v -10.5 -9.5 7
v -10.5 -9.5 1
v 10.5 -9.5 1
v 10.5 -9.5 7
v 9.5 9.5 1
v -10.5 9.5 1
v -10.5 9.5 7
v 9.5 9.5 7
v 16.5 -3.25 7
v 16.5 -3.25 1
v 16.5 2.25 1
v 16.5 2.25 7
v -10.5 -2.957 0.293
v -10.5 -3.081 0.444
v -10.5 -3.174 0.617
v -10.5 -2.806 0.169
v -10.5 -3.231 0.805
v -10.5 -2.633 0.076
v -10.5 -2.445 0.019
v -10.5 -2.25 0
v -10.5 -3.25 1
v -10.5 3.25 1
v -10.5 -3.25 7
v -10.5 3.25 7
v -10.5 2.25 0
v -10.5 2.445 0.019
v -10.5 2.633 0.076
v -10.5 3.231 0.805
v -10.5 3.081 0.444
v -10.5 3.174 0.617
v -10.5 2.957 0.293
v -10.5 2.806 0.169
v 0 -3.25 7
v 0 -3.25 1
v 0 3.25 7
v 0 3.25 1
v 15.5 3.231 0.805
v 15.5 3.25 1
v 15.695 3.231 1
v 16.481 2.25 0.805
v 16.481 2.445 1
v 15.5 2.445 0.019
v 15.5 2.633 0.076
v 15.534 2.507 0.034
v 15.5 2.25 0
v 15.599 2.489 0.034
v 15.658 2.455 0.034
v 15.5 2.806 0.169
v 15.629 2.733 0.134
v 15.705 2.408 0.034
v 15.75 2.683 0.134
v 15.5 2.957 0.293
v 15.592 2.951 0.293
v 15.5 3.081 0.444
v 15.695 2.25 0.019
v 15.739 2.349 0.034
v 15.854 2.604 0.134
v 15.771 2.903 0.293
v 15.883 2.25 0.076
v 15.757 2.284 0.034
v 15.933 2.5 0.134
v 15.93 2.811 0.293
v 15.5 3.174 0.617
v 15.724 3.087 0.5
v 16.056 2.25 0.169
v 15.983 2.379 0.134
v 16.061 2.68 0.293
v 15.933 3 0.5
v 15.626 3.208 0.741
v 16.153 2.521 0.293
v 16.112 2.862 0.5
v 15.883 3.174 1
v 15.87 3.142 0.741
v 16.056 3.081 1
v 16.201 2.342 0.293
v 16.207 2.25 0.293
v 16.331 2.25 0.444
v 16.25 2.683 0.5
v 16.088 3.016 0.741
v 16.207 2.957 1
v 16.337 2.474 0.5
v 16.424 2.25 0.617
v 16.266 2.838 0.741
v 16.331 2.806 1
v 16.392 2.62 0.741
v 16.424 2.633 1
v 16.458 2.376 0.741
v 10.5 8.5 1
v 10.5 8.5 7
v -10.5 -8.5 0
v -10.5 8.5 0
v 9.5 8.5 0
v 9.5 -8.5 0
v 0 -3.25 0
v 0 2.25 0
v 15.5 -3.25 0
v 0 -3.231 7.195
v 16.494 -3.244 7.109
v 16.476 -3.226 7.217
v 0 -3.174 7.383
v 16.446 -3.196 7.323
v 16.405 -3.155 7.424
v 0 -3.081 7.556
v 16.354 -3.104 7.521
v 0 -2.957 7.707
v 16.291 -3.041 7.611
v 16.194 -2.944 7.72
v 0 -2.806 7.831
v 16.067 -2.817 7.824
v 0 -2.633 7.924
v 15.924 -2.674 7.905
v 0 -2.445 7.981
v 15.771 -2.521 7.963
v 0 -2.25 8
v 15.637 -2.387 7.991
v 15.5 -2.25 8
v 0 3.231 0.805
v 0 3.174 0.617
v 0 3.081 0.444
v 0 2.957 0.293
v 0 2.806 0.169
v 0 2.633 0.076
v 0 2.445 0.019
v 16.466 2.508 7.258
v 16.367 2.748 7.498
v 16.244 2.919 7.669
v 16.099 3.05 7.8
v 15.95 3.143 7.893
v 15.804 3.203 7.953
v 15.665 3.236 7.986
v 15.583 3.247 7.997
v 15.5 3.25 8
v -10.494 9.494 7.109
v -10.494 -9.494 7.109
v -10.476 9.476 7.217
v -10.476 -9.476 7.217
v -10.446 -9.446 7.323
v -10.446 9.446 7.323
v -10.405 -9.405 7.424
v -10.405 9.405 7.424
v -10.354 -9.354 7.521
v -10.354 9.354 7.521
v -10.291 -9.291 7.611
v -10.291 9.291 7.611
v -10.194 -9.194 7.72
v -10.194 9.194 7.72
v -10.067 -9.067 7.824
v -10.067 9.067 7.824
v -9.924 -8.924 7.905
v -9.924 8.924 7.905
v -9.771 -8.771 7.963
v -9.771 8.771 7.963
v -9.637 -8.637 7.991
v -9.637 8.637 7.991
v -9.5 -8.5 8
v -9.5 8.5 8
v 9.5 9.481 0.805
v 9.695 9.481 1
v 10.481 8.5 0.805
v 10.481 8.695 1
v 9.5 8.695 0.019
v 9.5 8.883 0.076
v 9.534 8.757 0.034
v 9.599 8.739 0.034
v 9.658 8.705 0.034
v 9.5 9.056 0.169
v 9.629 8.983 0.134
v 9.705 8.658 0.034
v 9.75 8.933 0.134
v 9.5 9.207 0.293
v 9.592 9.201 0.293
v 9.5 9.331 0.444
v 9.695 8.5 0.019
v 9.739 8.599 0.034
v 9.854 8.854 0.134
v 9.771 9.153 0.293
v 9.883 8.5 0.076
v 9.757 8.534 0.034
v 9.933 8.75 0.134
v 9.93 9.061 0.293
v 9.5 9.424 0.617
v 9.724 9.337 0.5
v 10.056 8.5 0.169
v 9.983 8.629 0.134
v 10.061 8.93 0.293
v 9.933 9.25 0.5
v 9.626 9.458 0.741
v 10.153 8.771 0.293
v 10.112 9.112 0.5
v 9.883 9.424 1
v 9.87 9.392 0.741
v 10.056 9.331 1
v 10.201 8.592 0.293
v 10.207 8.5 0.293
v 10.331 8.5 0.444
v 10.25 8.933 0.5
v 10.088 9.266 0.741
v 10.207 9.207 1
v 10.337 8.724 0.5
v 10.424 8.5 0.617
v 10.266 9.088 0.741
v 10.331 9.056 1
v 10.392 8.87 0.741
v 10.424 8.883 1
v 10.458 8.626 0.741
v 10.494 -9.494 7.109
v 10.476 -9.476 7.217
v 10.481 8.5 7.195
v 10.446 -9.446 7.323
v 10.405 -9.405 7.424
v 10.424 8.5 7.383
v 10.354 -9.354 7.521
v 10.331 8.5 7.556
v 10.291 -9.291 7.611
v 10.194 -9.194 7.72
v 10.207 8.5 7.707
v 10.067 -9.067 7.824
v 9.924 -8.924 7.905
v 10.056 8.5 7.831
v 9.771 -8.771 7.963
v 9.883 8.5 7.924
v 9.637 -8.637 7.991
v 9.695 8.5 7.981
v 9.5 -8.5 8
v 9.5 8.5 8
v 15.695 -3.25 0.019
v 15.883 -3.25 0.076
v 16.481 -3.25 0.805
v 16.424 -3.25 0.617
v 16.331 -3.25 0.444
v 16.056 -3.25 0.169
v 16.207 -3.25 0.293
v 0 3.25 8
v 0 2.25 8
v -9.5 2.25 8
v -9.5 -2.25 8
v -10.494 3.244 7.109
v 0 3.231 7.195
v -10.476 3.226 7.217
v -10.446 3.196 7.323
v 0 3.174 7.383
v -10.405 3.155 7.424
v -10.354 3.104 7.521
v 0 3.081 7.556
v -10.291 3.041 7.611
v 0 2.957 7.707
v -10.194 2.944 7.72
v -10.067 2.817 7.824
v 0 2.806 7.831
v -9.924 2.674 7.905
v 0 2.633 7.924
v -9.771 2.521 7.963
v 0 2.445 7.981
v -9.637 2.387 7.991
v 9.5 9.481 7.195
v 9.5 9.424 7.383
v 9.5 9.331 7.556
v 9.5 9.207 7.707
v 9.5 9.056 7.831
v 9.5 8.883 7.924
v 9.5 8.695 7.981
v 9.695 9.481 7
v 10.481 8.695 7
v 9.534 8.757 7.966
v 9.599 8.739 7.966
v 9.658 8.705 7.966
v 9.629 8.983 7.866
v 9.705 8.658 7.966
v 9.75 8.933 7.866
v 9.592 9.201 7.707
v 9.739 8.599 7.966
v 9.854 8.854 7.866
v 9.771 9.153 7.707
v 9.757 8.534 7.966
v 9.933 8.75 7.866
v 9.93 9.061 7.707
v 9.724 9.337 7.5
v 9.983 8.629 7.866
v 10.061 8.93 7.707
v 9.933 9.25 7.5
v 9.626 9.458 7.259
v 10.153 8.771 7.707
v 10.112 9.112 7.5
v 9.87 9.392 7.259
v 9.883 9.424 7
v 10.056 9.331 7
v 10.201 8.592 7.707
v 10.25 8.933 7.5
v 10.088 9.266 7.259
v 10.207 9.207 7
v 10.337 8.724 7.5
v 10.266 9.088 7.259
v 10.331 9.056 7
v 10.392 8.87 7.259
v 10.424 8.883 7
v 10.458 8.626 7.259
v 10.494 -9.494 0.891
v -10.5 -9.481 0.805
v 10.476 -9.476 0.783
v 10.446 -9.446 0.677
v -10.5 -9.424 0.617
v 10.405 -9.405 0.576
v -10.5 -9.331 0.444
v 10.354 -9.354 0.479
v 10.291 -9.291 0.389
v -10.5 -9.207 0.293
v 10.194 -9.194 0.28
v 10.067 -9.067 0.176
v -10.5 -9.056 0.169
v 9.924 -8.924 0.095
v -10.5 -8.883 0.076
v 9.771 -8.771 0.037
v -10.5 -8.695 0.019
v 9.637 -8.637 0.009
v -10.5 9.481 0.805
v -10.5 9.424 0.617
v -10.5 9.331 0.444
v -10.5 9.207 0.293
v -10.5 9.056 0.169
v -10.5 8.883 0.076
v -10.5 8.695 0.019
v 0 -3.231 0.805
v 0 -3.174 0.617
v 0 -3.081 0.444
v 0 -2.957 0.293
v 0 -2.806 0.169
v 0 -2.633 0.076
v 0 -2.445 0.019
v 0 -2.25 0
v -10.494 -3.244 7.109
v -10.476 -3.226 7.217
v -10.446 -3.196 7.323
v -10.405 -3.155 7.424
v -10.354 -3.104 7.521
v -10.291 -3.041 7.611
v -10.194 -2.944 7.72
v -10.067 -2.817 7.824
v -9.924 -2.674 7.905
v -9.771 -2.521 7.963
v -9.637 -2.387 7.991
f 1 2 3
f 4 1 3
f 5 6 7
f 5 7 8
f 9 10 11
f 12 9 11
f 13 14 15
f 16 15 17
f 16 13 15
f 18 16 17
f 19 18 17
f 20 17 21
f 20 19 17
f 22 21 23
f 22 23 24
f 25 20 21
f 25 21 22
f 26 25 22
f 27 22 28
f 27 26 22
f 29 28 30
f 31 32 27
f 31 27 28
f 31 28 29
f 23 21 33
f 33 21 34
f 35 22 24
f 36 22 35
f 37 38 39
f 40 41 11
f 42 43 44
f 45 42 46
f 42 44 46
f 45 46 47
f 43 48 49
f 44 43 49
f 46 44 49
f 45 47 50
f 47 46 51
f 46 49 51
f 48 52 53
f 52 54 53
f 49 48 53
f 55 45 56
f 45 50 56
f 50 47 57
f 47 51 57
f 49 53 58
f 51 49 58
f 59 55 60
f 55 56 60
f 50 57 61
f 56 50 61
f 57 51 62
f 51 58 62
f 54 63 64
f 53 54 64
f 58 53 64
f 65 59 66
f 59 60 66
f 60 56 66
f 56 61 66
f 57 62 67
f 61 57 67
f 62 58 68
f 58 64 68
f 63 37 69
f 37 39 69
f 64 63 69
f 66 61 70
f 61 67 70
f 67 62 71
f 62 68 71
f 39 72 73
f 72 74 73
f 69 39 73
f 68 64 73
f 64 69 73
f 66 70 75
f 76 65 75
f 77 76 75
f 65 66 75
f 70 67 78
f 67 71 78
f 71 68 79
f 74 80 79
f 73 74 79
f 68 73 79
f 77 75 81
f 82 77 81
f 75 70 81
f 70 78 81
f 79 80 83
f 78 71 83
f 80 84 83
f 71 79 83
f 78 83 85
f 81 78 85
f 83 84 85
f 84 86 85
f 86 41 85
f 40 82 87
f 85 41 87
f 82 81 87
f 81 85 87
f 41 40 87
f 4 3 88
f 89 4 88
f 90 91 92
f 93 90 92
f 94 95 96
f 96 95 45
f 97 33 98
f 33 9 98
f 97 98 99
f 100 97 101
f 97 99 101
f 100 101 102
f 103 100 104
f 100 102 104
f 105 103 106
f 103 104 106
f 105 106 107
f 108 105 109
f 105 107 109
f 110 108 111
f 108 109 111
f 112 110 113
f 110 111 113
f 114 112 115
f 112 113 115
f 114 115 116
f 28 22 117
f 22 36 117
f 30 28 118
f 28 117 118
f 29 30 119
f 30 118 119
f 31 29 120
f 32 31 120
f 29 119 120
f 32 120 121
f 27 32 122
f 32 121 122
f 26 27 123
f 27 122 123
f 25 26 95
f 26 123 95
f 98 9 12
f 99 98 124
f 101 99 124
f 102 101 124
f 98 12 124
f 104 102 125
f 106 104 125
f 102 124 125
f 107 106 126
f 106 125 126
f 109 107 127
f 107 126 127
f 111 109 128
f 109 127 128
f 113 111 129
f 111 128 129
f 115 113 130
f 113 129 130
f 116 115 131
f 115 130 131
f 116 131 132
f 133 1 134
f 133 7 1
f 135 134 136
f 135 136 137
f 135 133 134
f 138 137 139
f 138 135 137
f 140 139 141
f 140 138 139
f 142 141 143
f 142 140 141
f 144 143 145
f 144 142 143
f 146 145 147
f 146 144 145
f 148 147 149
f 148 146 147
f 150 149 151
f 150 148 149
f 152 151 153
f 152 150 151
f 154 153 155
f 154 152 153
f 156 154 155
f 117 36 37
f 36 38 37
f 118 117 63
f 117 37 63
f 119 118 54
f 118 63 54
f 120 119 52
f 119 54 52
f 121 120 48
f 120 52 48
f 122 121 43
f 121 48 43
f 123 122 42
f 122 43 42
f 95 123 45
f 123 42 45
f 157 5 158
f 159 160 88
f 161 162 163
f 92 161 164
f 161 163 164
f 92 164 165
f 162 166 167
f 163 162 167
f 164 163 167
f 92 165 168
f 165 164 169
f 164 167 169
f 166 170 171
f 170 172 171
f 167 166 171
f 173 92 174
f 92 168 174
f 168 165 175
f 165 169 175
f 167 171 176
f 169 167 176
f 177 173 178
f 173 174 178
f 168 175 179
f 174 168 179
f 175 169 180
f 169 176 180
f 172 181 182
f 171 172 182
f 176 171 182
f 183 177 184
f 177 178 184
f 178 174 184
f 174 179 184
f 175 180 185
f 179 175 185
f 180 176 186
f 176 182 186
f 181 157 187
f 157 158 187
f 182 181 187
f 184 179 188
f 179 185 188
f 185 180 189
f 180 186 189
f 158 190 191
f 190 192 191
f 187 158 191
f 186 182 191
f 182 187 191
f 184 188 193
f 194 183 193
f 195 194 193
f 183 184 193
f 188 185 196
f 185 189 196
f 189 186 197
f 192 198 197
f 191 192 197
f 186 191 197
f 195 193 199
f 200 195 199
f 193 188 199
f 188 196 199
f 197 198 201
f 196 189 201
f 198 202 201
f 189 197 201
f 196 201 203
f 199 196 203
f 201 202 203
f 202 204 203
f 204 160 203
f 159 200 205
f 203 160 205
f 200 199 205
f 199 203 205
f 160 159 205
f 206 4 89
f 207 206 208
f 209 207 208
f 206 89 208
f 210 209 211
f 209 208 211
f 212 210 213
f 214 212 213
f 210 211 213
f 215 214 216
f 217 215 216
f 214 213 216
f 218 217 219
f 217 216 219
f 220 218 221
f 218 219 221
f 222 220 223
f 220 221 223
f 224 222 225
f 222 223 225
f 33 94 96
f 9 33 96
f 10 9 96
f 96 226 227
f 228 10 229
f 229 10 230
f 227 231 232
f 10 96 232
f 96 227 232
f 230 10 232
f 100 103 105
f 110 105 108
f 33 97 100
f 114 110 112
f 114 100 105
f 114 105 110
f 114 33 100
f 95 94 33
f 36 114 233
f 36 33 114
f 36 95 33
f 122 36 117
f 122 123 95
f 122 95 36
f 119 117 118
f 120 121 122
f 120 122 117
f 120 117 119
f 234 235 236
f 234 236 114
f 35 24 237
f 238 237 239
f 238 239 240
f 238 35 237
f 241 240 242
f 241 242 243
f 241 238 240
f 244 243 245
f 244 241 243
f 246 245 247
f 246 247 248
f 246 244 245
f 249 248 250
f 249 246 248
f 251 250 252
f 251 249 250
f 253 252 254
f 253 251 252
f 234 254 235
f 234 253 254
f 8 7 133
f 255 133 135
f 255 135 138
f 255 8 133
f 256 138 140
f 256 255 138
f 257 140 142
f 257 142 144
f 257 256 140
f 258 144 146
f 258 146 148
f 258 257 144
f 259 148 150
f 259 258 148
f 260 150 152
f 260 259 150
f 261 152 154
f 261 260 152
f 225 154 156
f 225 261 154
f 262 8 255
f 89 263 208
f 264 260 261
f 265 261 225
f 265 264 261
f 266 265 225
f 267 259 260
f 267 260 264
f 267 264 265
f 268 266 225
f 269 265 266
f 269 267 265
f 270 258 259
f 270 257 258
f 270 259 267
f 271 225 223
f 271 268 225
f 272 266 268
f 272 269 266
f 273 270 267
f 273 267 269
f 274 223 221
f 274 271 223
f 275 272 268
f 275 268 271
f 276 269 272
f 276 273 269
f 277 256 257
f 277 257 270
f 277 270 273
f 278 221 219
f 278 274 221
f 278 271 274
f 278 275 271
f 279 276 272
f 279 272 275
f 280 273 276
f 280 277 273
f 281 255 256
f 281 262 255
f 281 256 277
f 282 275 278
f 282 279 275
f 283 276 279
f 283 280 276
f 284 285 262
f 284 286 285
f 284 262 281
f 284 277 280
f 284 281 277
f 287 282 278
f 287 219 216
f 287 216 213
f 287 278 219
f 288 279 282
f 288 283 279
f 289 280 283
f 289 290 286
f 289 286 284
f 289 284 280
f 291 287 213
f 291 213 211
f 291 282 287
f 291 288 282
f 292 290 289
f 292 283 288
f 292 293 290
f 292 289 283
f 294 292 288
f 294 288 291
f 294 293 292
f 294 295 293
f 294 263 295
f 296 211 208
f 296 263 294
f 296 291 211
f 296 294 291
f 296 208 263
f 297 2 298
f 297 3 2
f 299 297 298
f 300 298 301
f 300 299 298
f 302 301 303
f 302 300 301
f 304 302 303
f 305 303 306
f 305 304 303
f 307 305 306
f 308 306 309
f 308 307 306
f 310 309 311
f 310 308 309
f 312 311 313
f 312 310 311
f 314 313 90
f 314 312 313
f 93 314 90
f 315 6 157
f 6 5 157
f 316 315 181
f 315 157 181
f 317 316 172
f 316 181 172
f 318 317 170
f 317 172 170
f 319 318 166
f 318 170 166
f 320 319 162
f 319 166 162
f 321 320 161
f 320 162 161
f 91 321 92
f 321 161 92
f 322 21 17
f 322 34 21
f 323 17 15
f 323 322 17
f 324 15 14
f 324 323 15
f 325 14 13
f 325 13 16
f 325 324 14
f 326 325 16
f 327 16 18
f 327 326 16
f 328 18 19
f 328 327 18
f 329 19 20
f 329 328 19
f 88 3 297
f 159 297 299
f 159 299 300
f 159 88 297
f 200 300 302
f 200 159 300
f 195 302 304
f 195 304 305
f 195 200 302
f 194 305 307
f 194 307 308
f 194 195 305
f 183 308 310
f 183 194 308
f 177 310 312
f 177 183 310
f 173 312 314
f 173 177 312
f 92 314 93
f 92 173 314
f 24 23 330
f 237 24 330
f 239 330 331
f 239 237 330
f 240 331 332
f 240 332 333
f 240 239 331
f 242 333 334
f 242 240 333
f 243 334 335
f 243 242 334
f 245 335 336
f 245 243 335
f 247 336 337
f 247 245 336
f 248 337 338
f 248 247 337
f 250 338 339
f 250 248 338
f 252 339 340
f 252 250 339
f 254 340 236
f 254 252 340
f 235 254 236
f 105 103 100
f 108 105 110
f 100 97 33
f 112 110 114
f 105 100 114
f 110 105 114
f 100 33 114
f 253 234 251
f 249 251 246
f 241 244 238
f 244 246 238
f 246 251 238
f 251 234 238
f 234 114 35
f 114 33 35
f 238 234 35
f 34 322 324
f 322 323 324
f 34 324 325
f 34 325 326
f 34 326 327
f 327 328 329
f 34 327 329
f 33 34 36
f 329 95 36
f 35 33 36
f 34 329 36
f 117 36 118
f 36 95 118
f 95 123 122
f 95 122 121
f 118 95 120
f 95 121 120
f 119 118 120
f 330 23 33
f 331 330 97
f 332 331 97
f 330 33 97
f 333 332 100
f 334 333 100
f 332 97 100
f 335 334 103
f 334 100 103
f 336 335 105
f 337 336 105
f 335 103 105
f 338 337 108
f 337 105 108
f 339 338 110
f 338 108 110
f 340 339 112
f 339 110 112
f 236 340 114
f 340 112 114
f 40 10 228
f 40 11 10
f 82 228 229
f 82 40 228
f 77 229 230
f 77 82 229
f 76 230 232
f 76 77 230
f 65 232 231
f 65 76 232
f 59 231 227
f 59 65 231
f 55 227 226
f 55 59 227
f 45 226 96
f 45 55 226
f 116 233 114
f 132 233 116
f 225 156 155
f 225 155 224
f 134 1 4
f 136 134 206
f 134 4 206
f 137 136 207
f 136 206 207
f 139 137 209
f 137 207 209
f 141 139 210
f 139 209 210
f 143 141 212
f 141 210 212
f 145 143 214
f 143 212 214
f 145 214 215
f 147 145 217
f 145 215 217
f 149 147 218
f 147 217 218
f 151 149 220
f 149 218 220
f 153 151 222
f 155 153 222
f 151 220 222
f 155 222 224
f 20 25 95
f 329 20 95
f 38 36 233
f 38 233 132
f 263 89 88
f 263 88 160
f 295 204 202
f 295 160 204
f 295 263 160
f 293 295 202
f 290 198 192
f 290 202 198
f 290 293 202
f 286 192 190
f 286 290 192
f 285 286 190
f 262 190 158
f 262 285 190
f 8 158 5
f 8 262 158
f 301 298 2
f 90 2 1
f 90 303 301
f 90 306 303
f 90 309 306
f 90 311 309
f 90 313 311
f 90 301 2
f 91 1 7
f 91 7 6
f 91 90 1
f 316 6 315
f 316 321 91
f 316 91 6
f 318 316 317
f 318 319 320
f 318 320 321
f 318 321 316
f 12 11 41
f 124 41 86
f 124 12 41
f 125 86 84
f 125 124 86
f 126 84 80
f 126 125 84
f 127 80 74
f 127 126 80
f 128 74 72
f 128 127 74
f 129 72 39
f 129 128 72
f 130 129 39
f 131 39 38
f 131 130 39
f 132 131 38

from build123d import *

# Parameters (mm, degrees)
SKETCH002_W      = 16.5
SKETCH002_H      = 6.5
EXTRUDE004_DEPTH = 8
FILLET_R         = 1
SKETCH_W         = 21
SKETCH_H         = 19
EXTRUDE_DEPTH    = 8
FILLET001_R      = 1
SKETCH001_W      = 10.5
SKETCH001_H      = 6.5
EXTRUDE001_DEPTH = 8
FILLET002_R      = 1


with BuildPart() as fillet_body:
    # Sketch002 → Extrude004 (new body)
    with BuildSketch(Plane.XY):
        with Locations((8.25, 0)):
            Rectangle(SKETCH002_W, SKETCH002_H)
    extrude(amount=EXTRUDE004_DEPTH)

    # Fillet
    fillet_edges = [fillet_body.edges().sort_by_distance(p)[0] for p in [
        (16.5, 3.25, 4),
        (8.25, 3.25, 0),
        (16.5, 0, 0),
        (16.5, 0, 8),
        (8.25, -3.25, 8),
    ]]
    fillet(fillet_edges, radius=FILLET_R)


with BuildPart() as fillet001:
    # Sketch → Extrude (new body)
    with BuildSketch(Plane.XY):
        Rectangle(SKETCH_W, SKETCH_H)
    extrude(amount=EXTRUDE_DEPTH)

    # Fillet001
    fillet001_edges = [fillet001.edges().sort_by_distance(p)[0] for p in [
        (10.5, 9.5, 4),
        (0, 9.5, 0),
        (0, 9.5, 8),
        (10.5, 0, 0),
        (10.5, 0, 8),
        (0, -9.5, 0),
        (0, -9.5, 8),
        (-10.5, 0, 8),
    ]]
    fillet(fillet001_edges, radius=FILLET001_R)


with BuildPart() as fillet002:
    # Sketch001 → Extrude001 (new body)
    with BuildSketch(Plane.XY):
        with Locations((-5.25, 0)):
            Rectangle(SKETCH001_W, SKETCH001_H)
    extrude(amount=EXTRUDE001_DEPTH)

    # Fillet002
    fillet002_edges = [fillet002.edges().sort_by_distance(p)[0] for p in [
        (-5.25, 3.25, 0),
        (-5.25, 3.25, 8),
        (-5.25, -3.25, 0),
        (-5.25, -3.25, 8),
        (-10.5, 0, 8),
    ]]
    fillet(fillet002_edges, radius=FILLET002_R)


solid = Compound([fillet_body.part, fillet001.part, fillet002.part])
